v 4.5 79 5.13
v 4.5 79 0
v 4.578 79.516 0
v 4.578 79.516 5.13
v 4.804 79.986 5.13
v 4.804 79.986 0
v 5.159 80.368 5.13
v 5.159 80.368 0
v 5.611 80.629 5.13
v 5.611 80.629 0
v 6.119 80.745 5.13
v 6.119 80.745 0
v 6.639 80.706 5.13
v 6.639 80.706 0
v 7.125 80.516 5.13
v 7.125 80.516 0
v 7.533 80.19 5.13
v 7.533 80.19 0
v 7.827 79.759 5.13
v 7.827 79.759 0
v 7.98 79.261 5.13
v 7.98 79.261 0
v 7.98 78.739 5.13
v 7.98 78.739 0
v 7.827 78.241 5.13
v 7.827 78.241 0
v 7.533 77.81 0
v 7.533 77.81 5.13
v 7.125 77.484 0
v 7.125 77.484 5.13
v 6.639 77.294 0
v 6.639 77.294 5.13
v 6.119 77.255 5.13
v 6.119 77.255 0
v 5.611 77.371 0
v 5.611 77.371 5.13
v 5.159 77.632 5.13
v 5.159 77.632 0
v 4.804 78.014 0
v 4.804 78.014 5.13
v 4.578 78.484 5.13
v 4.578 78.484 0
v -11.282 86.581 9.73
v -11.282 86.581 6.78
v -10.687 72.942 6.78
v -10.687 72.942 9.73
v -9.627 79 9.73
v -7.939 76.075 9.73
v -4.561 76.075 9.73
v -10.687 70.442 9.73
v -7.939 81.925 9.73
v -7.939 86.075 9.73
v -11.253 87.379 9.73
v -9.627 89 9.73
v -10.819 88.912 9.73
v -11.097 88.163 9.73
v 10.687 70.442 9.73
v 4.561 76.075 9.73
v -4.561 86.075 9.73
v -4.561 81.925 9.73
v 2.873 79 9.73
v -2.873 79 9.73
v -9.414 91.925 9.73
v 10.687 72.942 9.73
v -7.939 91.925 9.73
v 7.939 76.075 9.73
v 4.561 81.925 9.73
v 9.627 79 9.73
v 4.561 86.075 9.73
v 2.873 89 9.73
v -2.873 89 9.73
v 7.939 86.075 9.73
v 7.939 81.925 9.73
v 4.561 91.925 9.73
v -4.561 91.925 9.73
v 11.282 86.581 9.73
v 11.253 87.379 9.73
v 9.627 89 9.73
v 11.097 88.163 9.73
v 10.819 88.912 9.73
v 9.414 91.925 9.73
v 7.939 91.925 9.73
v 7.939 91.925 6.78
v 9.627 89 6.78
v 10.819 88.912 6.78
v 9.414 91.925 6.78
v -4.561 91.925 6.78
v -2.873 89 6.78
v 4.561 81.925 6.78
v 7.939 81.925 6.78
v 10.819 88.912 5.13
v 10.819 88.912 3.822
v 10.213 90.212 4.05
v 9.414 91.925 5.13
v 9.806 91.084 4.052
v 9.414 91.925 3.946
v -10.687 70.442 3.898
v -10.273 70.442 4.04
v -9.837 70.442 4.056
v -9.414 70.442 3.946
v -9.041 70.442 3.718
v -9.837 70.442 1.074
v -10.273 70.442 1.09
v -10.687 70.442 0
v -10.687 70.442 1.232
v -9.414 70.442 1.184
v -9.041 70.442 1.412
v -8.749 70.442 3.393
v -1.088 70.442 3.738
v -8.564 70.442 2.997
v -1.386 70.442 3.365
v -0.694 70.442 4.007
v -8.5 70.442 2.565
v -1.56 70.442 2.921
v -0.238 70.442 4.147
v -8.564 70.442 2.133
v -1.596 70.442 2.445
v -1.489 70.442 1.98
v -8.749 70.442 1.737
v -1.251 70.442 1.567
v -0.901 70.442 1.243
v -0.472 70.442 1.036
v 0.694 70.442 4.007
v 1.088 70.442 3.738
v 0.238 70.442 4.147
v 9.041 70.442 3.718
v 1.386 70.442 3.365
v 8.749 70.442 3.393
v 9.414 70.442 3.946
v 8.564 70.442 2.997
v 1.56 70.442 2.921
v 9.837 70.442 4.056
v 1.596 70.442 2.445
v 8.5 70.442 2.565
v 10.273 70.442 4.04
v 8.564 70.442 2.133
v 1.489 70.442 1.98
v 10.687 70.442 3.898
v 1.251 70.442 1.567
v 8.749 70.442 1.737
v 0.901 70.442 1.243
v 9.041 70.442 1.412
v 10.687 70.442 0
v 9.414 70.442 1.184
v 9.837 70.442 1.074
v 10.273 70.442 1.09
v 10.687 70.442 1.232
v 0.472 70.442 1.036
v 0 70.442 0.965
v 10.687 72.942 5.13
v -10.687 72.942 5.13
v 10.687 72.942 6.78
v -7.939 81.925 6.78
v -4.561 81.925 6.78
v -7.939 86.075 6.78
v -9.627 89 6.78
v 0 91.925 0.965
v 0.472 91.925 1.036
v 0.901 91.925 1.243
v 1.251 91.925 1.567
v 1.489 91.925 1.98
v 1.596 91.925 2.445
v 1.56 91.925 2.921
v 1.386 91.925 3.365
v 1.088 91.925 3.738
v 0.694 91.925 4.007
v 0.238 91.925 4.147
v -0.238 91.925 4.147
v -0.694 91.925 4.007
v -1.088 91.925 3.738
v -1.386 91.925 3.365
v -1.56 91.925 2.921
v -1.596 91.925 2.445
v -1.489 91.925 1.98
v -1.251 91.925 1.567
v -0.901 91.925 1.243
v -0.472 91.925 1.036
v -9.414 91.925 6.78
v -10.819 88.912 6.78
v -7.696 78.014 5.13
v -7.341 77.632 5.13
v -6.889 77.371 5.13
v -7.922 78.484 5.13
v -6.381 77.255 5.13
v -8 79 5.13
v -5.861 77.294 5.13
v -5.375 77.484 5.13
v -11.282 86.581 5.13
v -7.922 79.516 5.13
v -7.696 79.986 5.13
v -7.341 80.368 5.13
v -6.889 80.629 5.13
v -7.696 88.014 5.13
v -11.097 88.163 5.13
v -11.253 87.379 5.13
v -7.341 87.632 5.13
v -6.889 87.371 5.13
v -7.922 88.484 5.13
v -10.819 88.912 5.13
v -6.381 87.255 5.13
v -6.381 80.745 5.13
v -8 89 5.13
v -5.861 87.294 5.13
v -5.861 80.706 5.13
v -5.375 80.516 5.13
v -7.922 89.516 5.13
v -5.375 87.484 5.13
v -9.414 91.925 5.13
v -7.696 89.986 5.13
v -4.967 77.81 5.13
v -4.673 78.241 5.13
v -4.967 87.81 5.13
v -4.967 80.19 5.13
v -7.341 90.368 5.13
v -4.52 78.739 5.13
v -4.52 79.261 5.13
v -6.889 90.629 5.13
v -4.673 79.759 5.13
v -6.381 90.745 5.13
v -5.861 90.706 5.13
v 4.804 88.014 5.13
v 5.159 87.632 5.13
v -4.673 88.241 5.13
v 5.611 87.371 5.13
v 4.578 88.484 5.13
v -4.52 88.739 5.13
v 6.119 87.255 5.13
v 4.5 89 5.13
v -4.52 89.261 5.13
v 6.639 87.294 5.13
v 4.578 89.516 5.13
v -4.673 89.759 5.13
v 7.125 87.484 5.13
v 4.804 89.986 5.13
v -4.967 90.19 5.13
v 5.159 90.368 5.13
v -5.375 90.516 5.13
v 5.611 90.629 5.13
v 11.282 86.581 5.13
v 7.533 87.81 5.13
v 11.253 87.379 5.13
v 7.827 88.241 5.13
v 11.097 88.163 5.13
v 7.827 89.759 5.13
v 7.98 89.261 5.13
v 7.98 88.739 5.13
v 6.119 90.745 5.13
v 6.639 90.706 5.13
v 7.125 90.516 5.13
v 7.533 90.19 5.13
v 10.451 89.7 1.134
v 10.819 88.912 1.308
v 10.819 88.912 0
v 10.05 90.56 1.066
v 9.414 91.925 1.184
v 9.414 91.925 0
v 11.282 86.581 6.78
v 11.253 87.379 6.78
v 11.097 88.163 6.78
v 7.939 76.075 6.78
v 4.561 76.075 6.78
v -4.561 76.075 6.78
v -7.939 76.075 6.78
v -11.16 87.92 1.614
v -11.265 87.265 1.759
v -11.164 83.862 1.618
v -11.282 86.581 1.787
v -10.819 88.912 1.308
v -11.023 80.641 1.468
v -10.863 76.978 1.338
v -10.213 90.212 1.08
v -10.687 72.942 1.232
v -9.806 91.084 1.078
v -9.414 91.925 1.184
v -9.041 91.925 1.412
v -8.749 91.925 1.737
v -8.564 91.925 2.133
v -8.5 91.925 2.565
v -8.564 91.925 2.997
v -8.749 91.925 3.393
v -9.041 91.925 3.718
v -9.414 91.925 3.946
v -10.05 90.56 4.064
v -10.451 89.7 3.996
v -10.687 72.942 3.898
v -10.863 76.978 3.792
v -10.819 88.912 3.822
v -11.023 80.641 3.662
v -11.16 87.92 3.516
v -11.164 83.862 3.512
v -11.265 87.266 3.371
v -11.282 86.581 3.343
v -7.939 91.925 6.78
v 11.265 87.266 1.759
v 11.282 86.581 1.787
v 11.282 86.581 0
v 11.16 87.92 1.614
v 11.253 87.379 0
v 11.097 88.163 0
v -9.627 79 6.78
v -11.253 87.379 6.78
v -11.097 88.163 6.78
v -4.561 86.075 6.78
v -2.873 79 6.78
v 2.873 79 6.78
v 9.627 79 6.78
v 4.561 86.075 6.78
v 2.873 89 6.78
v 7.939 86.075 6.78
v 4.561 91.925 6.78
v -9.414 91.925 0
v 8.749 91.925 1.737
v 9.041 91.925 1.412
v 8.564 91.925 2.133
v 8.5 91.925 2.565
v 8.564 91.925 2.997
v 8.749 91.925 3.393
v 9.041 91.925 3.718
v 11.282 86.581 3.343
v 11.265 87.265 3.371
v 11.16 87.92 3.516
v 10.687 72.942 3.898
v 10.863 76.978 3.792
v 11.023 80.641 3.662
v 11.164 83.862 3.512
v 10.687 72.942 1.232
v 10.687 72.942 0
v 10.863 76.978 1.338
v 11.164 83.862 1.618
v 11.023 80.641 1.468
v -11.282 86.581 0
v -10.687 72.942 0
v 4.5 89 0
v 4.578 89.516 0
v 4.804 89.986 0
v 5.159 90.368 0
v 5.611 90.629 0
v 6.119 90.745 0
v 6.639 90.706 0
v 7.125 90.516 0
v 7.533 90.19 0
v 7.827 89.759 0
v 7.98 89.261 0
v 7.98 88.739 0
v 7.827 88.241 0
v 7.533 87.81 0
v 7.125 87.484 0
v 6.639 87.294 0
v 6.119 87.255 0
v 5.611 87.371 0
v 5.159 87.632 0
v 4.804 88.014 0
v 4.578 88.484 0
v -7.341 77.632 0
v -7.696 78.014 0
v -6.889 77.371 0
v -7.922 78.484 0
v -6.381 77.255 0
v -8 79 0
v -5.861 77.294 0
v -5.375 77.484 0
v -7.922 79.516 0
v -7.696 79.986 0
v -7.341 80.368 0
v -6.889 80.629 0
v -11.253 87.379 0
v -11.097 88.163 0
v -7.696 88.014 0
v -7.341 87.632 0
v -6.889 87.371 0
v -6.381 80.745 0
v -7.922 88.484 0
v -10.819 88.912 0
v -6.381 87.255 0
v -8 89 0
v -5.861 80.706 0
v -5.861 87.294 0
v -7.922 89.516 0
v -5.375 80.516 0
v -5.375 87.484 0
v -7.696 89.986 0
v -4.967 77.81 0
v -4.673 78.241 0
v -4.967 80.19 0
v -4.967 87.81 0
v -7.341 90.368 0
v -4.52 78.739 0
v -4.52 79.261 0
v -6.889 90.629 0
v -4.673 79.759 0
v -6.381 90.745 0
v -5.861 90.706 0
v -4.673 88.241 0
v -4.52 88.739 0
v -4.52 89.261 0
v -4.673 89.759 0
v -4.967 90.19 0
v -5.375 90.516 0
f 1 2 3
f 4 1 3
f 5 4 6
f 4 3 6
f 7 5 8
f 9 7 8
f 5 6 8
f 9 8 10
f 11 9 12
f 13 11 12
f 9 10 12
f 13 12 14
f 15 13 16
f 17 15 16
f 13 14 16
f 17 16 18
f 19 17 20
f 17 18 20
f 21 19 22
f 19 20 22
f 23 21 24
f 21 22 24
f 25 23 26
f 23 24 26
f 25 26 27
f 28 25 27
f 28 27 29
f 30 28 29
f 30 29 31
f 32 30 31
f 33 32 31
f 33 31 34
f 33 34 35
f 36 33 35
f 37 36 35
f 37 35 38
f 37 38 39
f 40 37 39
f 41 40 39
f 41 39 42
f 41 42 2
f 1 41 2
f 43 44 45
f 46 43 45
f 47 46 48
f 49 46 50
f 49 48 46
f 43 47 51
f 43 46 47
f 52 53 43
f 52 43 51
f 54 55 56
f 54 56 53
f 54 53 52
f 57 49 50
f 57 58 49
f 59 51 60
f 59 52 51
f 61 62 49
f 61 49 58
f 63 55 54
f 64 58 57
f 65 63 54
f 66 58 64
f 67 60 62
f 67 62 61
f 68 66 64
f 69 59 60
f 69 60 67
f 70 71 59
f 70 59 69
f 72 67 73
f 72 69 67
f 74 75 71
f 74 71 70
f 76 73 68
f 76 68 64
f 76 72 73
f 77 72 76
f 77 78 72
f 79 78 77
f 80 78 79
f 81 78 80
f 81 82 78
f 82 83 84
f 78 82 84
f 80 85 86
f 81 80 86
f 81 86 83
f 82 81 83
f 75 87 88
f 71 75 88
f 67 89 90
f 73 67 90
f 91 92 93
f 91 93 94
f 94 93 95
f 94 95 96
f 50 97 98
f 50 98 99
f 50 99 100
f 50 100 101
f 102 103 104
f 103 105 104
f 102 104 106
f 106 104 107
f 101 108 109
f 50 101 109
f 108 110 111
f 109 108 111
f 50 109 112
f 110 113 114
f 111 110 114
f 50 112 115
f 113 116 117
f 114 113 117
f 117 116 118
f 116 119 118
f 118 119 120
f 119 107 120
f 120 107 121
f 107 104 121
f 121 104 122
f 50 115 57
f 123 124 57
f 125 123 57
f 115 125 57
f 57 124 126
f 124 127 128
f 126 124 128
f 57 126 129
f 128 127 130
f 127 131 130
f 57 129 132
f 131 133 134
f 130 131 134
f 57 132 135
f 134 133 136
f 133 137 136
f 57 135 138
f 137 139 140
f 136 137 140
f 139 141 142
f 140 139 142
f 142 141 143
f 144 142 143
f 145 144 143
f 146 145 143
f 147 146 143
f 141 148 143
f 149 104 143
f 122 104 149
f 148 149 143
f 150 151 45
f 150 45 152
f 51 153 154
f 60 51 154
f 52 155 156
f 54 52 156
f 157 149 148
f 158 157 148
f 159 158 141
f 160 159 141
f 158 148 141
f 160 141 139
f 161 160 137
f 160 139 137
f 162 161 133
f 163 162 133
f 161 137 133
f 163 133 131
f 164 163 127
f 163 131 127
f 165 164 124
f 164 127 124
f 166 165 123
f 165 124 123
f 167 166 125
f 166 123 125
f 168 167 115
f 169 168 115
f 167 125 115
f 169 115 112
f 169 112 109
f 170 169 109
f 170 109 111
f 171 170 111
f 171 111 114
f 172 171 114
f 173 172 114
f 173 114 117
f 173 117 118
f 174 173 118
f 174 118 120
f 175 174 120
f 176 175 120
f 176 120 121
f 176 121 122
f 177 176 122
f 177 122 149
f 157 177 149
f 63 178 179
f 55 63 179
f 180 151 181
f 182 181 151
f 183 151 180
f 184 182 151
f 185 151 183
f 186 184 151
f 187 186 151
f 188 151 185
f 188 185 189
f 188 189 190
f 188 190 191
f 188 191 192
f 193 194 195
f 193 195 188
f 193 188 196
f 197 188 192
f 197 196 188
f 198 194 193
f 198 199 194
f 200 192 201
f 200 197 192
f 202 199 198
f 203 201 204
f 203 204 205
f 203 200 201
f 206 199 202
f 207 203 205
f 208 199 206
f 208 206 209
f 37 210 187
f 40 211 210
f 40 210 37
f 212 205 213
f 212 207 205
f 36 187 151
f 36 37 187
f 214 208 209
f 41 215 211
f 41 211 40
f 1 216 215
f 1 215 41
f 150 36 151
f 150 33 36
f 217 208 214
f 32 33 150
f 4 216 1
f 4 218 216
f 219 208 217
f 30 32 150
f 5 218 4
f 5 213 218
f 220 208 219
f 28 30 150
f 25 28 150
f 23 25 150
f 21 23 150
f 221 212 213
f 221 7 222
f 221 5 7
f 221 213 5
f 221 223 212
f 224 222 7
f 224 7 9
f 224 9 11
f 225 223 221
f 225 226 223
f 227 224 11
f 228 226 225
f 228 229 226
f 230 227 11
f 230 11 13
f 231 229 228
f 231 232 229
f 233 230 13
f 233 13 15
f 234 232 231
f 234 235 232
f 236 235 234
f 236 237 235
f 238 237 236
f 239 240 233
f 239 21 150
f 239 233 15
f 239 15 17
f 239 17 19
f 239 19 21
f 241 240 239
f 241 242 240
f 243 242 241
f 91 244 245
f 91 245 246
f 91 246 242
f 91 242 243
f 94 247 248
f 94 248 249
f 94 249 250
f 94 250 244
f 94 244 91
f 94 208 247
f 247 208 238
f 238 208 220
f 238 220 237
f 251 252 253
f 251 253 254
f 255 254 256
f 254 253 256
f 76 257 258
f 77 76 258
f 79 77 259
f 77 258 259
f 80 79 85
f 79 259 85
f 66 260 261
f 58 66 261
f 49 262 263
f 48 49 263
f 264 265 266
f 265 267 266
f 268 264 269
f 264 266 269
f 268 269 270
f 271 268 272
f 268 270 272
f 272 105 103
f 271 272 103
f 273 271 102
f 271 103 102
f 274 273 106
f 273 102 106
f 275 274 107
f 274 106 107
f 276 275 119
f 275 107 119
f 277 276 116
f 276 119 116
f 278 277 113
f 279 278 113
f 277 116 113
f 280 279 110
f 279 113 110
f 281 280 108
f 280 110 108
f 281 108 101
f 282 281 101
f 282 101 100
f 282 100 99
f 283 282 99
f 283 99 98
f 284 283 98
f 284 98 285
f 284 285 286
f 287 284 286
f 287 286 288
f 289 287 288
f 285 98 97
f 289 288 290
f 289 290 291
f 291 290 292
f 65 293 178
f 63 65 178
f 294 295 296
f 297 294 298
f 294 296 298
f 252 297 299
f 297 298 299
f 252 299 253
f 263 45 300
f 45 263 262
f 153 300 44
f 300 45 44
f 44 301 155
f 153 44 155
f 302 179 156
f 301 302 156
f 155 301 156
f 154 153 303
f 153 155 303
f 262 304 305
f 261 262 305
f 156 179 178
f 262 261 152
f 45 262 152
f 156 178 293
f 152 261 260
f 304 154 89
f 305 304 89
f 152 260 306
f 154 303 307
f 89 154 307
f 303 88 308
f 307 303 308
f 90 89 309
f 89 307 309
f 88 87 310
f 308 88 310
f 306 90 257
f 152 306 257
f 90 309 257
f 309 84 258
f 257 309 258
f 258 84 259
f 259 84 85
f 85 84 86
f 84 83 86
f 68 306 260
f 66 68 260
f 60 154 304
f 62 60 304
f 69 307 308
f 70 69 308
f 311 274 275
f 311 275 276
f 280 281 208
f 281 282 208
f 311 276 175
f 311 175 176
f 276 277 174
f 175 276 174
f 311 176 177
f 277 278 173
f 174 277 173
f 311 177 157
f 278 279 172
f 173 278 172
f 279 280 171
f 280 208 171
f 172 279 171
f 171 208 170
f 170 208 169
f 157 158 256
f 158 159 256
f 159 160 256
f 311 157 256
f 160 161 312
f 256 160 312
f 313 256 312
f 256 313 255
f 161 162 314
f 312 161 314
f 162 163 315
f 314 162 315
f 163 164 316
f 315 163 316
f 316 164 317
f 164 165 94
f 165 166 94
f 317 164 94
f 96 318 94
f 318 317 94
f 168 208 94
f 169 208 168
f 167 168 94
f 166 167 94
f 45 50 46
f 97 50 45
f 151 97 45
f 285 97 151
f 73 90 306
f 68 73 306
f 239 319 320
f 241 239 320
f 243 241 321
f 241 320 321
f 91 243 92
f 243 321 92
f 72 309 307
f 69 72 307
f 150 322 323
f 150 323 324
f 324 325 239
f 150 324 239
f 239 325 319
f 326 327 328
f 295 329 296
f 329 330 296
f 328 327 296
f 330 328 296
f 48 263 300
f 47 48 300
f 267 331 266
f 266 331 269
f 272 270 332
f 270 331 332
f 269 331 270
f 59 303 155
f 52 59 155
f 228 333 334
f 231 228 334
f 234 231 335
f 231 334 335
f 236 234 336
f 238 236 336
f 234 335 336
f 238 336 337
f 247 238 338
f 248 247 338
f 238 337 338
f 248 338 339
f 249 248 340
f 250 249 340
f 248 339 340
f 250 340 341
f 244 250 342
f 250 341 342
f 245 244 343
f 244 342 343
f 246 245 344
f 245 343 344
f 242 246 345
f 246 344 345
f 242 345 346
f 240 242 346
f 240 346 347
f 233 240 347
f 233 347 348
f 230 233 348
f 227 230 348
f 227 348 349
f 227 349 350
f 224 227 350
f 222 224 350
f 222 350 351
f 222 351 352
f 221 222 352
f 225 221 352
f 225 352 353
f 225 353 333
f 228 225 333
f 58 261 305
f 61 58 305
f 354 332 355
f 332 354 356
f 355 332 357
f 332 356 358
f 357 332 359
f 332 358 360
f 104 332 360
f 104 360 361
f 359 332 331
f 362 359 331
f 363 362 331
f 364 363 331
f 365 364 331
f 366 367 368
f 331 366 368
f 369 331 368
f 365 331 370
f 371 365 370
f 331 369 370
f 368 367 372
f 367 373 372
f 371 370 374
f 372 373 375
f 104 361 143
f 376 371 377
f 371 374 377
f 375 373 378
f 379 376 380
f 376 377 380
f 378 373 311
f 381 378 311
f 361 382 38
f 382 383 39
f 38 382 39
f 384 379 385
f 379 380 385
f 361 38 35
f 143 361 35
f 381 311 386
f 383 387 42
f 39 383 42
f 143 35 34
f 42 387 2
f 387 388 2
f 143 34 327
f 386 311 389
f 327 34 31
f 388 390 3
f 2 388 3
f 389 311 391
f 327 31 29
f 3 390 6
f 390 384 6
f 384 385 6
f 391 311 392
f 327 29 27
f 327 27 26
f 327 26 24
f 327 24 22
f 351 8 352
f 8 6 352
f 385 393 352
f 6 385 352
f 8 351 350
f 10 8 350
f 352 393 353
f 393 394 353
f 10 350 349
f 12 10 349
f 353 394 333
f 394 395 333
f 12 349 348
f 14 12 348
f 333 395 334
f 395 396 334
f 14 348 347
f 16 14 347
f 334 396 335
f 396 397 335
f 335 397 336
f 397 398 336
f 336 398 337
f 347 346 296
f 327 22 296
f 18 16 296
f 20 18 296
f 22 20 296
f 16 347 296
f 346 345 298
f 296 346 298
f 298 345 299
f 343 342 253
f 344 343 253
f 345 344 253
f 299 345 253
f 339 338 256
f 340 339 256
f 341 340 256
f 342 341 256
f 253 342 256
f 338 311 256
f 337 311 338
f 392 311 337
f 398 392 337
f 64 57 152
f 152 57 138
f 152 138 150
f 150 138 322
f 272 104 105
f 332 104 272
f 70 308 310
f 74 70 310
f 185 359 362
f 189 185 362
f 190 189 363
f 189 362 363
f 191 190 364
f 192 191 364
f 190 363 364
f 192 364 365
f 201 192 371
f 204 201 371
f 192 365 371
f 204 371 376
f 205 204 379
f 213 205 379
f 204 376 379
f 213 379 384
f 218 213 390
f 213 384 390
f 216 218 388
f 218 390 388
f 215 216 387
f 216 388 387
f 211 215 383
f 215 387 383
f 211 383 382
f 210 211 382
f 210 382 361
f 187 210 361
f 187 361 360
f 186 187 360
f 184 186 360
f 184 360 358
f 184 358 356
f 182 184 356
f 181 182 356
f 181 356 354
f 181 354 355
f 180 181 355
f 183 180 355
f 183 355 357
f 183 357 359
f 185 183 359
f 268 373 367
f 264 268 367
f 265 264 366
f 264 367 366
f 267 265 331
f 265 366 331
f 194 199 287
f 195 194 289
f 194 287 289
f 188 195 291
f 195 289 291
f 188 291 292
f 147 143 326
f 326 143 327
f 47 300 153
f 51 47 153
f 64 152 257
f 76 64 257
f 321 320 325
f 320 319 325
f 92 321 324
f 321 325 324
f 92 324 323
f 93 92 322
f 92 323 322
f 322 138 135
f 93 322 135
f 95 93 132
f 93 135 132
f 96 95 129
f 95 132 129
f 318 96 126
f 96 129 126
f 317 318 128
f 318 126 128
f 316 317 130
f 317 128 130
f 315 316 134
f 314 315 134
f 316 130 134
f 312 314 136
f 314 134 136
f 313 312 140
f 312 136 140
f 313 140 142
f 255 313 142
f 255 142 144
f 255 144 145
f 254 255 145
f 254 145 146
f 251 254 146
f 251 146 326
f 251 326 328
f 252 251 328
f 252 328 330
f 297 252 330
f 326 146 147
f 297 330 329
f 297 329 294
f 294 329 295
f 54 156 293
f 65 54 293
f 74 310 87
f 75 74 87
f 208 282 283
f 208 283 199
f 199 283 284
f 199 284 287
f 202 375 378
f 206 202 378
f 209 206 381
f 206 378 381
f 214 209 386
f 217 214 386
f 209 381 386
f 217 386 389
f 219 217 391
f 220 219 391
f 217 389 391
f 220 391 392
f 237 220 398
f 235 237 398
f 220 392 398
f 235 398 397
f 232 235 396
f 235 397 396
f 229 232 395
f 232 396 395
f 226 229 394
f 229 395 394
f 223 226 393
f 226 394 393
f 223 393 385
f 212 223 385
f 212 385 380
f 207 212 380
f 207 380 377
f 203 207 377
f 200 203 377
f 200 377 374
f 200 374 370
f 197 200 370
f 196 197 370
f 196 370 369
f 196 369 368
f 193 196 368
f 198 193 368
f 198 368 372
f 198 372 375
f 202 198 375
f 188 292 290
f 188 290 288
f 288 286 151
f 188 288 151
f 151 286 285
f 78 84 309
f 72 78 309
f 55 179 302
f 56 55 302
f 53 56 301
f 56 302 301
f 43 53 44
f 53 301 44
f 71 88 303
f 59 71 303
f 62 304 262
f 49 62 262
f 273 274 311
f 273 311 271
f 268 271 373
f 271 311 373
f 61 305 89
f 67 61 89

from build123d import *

# Parameters (mm, degrees)
SKETCH1_R           = 1.5
BOSS_EXTRUDE1_DEPTH = 5.13
SKETCH2_W           = 21.373732632
SKETCH2_H           = 5.13
BOSS_EXTRUDE2_DEPTH = 2.5
SKETCH3_W           = 21.373732632
SKETCH3_H           = 2.5
BOSS_EXTRUDE3_DEPTH = 4.6
BOSS_EXTRUDE4_START = -2.95
BOSS_EXTRUDE4_DEPTH = 2.95
CUT_EXTRUDE1_REACH  = 103.599
SKETCH5_R           = 1.75
SKETCH6_R           = 1.6
SKETCH6_R_2         = 1.5
CUT_EXTRUDE2_DEPTH  = 34.549423701
CUT_EXTRUDE3_REACH  = 103.262


with BuildPart() as part:
    # Sketch1 → Boss-Extrude1 (new body)
    with BuildSketch(Plane.XY):
        with BuildLine():
            Line((-11.282357346, 86.580844321), (-10.686866316, 72.941857381))
            Line((-10.686866316, 72.941857381), (10.686866316, 72.941857381))
            Line((10.686866316, 72.941857381), (11.282357346, 86.580844321))
            ThreePointArc((11.282357346, 86.580844321), (11.19104264, 87.774392868), (10.818655174, 88.912032567))
            Line((10.818655174, 88.912032567), (7.70361619, 95.592255225))
            ThreePointArc((7.70361619, 95.592255225), (0, 100.5), (-7.70361619, 95.592255225))
            Line((-7.70361619, 95.592255225), (-10.818655174, 88.912032567))
            ThreePointArc((-10.818655174, 88.912032567), (-11.19104264, 87.774392868), (-11.282357346, 86.580844321))
        make_face()
        with Locations((-6.25, 79)):
            Circle(SKETCH1_R, mode=Mode.SUBTRACT)
        with Locations((-6.25, 89)):
            Circle(SKETCH1_R, mode=Mode.SUBTRACT)
        with Locations((6.25, 79)):
            Circle(SKETCH1_R, mode=Mode.SUBTRACT)
        with Locations((6.25, 89)):
            Circle(SKETCH1_R, mode=Mode.SUBTRACT)
    extrude(amount=BOSS_EXTRUDE1_DEPTH)

    # Sketch2 → Boss-Extrude2 (add)
    with BuildSketch(Plane.XZ.offset(-72.941857381)):
        with Locations((0, 2.565)):
            Rectangle(SKETCH2_W, SKETCH2_H)
    extrude(amount=BOSS_EXTRUDE2_DEPTH)

    # Sketch3 → Boss-Extrude3 (add)
    with BuildSketch(Plane.XY.offset(5.13)):
        with Locations((0, 71.691857381)):
            Rectangle(SKETCH3_W, SKETCH3_H)
    extrude(amount=BOSS_EXTRUDE3_DEPTH)

    # Sketch4 → Boss-Extrude4 (add)
    with BuildSketch(Plane.XY.offset(9.73).offset(BOSS_EXTRUDE4_START)):
        with BuildLine():
            Line((4.561250463, 86.075), (2.872500925, 89))
            Line((2.872500925, 89), (4.561250463, 91.925))
            Line((4.561250463, 91.925), (-4.561250463, 91.925))
            Line((-4.561250463, 91.925), (-2.872500925, 89))
            Line((-2.872500925, 89), (-4.561250463, 86.075))
            Line((-4.561250463, 86.075), (-7.938749537, 86.075))
            Line((-7.938749537, 86.075), (-9.627499075, 89))
            Line((-9.627499075, 89), (-7.938749537, 91.925))
            Line((-7.938749537, 91.925), (-9.413685386, 91.925))
            Line((-9.413685386, 91.925), (-10.818655174, 88.912032567))
            ThreePointArc((-10.818655174, 88.912032567), (-11.19104264, 87.774392868), (-11.282357346, 86.580844321))
            Line((-11.282357346, 86.580844321), (-10.686866316, 72.941857381))
            Line((-10.686866316, 72.941857381), (10.686866316, 72.941857381))
            Line((10.686866316, 72.941857381), (11.282357346, 86.580844321))
            ThreePointArc((11.282357346, 86.580844321), (11.19104264, 87.774392868), (10.818655174, 88.912032567))
            Line((10.818655174, 88.912032567), (9.413685386, 91.925))
            Line((9.413685386, 91.925), (7.938749537, 91.925))
            Line((7.938749537, 91.925), (9.627499075, 89))
            Line((9.627499075, 89), (7.938749537, 86.075))
            Line((7.938749537, 86.075), (4.561250463, 86.075))
        make_face()
        Polygon((-4.561250463, 81.925), (-2.872500925, 79), (-4.561250463, 76.075), (-7.938749537, 76.075), (-9.627499075, 79), (-7.938749537, 81.925), align=None, mode=Mode.SUBTRACT)
        Polygon((7.938749537, 81.925), (9.627499075, 79), (7.938749537, 76.075), (4.561250463, 76.075), (2.872500925, 79), (4.561250463, 81.925), align=None, mode=Mode.SUBTRACT)
    extrude(amount=BOSS_EXTRUDE4_DEPTH)

    # Sketch5 → Cut-Extrude1 (cut, up to next)
    with BuildSketch(Plane(origin=(0, 0, 0), x_dir=(-1, 0, 0), z_dir=(0, 0, -1)), mode=Mode.PRIVATE) as cut_extrude1_sk1:
        with Locations((-6.25, 89)):
            Circle(SKETCH5_R)
    cut_extrude1_tool1 = extrude(cut_extrude1_sk1.sketch, amount=-CUT_EXTRUDE1_REACH, mode=Mode.PRIVATE) & part.part
    # Sketch5 → Cut-Extrude1 (cut, up to next)
    with BuildSketch(Plane(origin=(0, 0, 0), x_dir=(-1, 0, 0), z_dir=(0, 0, -1)), mode=Mode.PRIVATE) as cut_extrude1_sk2:
        with Locations((6.25, 89)):
            Circle(SKETCH5_R)
    cut_extrude1_tool2 = extrude(cut_extrude1_sk2.sketch, amount=-CUT_EXTRUDE1_REACH, mode=Mode.PRIVATE) & part.part
    # Sketch5 → Cut-Extrude1 (cut, up to next)
    with BuildSketch(Plane(origin=(0, 0, 0), x_dir=(-1, 0, 0), z_dir=(0, 0, -1)), mode=Mode.PRIVATE) as cut_extrude1_sk3:
        with Locations((6.25, 79)):
            Circle(SKETCH5_R)
    cut_extrude1_tool3 = extrude(cut_extrude1_sk3.sketch, amount=-CUT_EXTRUDE1_REACH, mode=Mode.PRIVATE) & part.part
    # Sketch5 → Cut-Extrude1 (cut, up to next)
    with BuildSketch(Plane(origin=(0, 0, 0), x_dir=(-1, 0, 0), z_dir=(0, 0, -1)), mode=Mode.PRIVATE) as cut_extrude1_sk4:
        with Locations((-6.25, 79)):
            Circle(SKETCH5_R)
    cut_extrude1_tool4 = extrude(cut_extrude1_sk4.sketch, amount=-CUT_EXTRUDE1_REACH, mode=Mode.PRIVATE) & part.part
    add(cut_extrude1_tool1.solids().sort_by_distance((6.25, 89, 0))[0], mode=Mode.SUBTRACT)
    add(cut_extrude1_tool2.solids().sort_by_distance((-6.25, 89, 0))[0], mode=Mode.SUBTRACT)
    add(cut_extrude1_tool3.solids().sort_by_distance((-6.25, 79, 0))[0], mode=Mode.SUBTRACT)
    add(cut_extrude1_tool4.solids().sort_by_distance((6.25, 79, 0))[0], mode=Mode.SUBTRACT)

    # Sketch6 → Cut-Extrude2 (cut, through all)
    with BuildSketch(Plane.XZ.offset(-70.441857381)):
        with Locations(Location((0, 2.565, 0), (0, 0, 270))):
            Circle(SKETCH6_R)
        with Locations((-10, 2.565)):
            Circle(SKETCH6_R_2)
        with Locations((10, 2.565)):
            Circle(SKETCH6_R_2)
    extrude(amount=-CUT_EXTRUDE2_DEPTH, mode=Mode.SUBTRACT)

    # Sketch7 → Cut-Extrude3 (cut, up to next)
    with BuildSketch(Plane.XY.offset(5.13), mode=Mode.PRIVATE) as cut_extrude3_sk1:
        with BuildLine():
            Line((-7.70361619, 95.592255225), (-9.413685386, 91.925))
            Line((-9.413685386, 91.925), (9.413685386, 91.925))
            Line((9.413685386, 91.925), (7.70361619, 95.592255225))
            ThreePointArc((7.70361619, 95.592255225), (0, 100.5), (-7.70361619, 95.592255225))
        make_face()
    cut_extrude3_tool1 = extrude(cut_extrude3_sk1.sketch, amount=-CUT_EXTRUDE3_REACH, mode=Mode.PRIVATE) & part.part
    add(cut_extrude3_tool1.solids().sort_by_distance((0, 95.513825, 5.13))[0], mode=Mode.SUBTRACT)


solid = part.part
